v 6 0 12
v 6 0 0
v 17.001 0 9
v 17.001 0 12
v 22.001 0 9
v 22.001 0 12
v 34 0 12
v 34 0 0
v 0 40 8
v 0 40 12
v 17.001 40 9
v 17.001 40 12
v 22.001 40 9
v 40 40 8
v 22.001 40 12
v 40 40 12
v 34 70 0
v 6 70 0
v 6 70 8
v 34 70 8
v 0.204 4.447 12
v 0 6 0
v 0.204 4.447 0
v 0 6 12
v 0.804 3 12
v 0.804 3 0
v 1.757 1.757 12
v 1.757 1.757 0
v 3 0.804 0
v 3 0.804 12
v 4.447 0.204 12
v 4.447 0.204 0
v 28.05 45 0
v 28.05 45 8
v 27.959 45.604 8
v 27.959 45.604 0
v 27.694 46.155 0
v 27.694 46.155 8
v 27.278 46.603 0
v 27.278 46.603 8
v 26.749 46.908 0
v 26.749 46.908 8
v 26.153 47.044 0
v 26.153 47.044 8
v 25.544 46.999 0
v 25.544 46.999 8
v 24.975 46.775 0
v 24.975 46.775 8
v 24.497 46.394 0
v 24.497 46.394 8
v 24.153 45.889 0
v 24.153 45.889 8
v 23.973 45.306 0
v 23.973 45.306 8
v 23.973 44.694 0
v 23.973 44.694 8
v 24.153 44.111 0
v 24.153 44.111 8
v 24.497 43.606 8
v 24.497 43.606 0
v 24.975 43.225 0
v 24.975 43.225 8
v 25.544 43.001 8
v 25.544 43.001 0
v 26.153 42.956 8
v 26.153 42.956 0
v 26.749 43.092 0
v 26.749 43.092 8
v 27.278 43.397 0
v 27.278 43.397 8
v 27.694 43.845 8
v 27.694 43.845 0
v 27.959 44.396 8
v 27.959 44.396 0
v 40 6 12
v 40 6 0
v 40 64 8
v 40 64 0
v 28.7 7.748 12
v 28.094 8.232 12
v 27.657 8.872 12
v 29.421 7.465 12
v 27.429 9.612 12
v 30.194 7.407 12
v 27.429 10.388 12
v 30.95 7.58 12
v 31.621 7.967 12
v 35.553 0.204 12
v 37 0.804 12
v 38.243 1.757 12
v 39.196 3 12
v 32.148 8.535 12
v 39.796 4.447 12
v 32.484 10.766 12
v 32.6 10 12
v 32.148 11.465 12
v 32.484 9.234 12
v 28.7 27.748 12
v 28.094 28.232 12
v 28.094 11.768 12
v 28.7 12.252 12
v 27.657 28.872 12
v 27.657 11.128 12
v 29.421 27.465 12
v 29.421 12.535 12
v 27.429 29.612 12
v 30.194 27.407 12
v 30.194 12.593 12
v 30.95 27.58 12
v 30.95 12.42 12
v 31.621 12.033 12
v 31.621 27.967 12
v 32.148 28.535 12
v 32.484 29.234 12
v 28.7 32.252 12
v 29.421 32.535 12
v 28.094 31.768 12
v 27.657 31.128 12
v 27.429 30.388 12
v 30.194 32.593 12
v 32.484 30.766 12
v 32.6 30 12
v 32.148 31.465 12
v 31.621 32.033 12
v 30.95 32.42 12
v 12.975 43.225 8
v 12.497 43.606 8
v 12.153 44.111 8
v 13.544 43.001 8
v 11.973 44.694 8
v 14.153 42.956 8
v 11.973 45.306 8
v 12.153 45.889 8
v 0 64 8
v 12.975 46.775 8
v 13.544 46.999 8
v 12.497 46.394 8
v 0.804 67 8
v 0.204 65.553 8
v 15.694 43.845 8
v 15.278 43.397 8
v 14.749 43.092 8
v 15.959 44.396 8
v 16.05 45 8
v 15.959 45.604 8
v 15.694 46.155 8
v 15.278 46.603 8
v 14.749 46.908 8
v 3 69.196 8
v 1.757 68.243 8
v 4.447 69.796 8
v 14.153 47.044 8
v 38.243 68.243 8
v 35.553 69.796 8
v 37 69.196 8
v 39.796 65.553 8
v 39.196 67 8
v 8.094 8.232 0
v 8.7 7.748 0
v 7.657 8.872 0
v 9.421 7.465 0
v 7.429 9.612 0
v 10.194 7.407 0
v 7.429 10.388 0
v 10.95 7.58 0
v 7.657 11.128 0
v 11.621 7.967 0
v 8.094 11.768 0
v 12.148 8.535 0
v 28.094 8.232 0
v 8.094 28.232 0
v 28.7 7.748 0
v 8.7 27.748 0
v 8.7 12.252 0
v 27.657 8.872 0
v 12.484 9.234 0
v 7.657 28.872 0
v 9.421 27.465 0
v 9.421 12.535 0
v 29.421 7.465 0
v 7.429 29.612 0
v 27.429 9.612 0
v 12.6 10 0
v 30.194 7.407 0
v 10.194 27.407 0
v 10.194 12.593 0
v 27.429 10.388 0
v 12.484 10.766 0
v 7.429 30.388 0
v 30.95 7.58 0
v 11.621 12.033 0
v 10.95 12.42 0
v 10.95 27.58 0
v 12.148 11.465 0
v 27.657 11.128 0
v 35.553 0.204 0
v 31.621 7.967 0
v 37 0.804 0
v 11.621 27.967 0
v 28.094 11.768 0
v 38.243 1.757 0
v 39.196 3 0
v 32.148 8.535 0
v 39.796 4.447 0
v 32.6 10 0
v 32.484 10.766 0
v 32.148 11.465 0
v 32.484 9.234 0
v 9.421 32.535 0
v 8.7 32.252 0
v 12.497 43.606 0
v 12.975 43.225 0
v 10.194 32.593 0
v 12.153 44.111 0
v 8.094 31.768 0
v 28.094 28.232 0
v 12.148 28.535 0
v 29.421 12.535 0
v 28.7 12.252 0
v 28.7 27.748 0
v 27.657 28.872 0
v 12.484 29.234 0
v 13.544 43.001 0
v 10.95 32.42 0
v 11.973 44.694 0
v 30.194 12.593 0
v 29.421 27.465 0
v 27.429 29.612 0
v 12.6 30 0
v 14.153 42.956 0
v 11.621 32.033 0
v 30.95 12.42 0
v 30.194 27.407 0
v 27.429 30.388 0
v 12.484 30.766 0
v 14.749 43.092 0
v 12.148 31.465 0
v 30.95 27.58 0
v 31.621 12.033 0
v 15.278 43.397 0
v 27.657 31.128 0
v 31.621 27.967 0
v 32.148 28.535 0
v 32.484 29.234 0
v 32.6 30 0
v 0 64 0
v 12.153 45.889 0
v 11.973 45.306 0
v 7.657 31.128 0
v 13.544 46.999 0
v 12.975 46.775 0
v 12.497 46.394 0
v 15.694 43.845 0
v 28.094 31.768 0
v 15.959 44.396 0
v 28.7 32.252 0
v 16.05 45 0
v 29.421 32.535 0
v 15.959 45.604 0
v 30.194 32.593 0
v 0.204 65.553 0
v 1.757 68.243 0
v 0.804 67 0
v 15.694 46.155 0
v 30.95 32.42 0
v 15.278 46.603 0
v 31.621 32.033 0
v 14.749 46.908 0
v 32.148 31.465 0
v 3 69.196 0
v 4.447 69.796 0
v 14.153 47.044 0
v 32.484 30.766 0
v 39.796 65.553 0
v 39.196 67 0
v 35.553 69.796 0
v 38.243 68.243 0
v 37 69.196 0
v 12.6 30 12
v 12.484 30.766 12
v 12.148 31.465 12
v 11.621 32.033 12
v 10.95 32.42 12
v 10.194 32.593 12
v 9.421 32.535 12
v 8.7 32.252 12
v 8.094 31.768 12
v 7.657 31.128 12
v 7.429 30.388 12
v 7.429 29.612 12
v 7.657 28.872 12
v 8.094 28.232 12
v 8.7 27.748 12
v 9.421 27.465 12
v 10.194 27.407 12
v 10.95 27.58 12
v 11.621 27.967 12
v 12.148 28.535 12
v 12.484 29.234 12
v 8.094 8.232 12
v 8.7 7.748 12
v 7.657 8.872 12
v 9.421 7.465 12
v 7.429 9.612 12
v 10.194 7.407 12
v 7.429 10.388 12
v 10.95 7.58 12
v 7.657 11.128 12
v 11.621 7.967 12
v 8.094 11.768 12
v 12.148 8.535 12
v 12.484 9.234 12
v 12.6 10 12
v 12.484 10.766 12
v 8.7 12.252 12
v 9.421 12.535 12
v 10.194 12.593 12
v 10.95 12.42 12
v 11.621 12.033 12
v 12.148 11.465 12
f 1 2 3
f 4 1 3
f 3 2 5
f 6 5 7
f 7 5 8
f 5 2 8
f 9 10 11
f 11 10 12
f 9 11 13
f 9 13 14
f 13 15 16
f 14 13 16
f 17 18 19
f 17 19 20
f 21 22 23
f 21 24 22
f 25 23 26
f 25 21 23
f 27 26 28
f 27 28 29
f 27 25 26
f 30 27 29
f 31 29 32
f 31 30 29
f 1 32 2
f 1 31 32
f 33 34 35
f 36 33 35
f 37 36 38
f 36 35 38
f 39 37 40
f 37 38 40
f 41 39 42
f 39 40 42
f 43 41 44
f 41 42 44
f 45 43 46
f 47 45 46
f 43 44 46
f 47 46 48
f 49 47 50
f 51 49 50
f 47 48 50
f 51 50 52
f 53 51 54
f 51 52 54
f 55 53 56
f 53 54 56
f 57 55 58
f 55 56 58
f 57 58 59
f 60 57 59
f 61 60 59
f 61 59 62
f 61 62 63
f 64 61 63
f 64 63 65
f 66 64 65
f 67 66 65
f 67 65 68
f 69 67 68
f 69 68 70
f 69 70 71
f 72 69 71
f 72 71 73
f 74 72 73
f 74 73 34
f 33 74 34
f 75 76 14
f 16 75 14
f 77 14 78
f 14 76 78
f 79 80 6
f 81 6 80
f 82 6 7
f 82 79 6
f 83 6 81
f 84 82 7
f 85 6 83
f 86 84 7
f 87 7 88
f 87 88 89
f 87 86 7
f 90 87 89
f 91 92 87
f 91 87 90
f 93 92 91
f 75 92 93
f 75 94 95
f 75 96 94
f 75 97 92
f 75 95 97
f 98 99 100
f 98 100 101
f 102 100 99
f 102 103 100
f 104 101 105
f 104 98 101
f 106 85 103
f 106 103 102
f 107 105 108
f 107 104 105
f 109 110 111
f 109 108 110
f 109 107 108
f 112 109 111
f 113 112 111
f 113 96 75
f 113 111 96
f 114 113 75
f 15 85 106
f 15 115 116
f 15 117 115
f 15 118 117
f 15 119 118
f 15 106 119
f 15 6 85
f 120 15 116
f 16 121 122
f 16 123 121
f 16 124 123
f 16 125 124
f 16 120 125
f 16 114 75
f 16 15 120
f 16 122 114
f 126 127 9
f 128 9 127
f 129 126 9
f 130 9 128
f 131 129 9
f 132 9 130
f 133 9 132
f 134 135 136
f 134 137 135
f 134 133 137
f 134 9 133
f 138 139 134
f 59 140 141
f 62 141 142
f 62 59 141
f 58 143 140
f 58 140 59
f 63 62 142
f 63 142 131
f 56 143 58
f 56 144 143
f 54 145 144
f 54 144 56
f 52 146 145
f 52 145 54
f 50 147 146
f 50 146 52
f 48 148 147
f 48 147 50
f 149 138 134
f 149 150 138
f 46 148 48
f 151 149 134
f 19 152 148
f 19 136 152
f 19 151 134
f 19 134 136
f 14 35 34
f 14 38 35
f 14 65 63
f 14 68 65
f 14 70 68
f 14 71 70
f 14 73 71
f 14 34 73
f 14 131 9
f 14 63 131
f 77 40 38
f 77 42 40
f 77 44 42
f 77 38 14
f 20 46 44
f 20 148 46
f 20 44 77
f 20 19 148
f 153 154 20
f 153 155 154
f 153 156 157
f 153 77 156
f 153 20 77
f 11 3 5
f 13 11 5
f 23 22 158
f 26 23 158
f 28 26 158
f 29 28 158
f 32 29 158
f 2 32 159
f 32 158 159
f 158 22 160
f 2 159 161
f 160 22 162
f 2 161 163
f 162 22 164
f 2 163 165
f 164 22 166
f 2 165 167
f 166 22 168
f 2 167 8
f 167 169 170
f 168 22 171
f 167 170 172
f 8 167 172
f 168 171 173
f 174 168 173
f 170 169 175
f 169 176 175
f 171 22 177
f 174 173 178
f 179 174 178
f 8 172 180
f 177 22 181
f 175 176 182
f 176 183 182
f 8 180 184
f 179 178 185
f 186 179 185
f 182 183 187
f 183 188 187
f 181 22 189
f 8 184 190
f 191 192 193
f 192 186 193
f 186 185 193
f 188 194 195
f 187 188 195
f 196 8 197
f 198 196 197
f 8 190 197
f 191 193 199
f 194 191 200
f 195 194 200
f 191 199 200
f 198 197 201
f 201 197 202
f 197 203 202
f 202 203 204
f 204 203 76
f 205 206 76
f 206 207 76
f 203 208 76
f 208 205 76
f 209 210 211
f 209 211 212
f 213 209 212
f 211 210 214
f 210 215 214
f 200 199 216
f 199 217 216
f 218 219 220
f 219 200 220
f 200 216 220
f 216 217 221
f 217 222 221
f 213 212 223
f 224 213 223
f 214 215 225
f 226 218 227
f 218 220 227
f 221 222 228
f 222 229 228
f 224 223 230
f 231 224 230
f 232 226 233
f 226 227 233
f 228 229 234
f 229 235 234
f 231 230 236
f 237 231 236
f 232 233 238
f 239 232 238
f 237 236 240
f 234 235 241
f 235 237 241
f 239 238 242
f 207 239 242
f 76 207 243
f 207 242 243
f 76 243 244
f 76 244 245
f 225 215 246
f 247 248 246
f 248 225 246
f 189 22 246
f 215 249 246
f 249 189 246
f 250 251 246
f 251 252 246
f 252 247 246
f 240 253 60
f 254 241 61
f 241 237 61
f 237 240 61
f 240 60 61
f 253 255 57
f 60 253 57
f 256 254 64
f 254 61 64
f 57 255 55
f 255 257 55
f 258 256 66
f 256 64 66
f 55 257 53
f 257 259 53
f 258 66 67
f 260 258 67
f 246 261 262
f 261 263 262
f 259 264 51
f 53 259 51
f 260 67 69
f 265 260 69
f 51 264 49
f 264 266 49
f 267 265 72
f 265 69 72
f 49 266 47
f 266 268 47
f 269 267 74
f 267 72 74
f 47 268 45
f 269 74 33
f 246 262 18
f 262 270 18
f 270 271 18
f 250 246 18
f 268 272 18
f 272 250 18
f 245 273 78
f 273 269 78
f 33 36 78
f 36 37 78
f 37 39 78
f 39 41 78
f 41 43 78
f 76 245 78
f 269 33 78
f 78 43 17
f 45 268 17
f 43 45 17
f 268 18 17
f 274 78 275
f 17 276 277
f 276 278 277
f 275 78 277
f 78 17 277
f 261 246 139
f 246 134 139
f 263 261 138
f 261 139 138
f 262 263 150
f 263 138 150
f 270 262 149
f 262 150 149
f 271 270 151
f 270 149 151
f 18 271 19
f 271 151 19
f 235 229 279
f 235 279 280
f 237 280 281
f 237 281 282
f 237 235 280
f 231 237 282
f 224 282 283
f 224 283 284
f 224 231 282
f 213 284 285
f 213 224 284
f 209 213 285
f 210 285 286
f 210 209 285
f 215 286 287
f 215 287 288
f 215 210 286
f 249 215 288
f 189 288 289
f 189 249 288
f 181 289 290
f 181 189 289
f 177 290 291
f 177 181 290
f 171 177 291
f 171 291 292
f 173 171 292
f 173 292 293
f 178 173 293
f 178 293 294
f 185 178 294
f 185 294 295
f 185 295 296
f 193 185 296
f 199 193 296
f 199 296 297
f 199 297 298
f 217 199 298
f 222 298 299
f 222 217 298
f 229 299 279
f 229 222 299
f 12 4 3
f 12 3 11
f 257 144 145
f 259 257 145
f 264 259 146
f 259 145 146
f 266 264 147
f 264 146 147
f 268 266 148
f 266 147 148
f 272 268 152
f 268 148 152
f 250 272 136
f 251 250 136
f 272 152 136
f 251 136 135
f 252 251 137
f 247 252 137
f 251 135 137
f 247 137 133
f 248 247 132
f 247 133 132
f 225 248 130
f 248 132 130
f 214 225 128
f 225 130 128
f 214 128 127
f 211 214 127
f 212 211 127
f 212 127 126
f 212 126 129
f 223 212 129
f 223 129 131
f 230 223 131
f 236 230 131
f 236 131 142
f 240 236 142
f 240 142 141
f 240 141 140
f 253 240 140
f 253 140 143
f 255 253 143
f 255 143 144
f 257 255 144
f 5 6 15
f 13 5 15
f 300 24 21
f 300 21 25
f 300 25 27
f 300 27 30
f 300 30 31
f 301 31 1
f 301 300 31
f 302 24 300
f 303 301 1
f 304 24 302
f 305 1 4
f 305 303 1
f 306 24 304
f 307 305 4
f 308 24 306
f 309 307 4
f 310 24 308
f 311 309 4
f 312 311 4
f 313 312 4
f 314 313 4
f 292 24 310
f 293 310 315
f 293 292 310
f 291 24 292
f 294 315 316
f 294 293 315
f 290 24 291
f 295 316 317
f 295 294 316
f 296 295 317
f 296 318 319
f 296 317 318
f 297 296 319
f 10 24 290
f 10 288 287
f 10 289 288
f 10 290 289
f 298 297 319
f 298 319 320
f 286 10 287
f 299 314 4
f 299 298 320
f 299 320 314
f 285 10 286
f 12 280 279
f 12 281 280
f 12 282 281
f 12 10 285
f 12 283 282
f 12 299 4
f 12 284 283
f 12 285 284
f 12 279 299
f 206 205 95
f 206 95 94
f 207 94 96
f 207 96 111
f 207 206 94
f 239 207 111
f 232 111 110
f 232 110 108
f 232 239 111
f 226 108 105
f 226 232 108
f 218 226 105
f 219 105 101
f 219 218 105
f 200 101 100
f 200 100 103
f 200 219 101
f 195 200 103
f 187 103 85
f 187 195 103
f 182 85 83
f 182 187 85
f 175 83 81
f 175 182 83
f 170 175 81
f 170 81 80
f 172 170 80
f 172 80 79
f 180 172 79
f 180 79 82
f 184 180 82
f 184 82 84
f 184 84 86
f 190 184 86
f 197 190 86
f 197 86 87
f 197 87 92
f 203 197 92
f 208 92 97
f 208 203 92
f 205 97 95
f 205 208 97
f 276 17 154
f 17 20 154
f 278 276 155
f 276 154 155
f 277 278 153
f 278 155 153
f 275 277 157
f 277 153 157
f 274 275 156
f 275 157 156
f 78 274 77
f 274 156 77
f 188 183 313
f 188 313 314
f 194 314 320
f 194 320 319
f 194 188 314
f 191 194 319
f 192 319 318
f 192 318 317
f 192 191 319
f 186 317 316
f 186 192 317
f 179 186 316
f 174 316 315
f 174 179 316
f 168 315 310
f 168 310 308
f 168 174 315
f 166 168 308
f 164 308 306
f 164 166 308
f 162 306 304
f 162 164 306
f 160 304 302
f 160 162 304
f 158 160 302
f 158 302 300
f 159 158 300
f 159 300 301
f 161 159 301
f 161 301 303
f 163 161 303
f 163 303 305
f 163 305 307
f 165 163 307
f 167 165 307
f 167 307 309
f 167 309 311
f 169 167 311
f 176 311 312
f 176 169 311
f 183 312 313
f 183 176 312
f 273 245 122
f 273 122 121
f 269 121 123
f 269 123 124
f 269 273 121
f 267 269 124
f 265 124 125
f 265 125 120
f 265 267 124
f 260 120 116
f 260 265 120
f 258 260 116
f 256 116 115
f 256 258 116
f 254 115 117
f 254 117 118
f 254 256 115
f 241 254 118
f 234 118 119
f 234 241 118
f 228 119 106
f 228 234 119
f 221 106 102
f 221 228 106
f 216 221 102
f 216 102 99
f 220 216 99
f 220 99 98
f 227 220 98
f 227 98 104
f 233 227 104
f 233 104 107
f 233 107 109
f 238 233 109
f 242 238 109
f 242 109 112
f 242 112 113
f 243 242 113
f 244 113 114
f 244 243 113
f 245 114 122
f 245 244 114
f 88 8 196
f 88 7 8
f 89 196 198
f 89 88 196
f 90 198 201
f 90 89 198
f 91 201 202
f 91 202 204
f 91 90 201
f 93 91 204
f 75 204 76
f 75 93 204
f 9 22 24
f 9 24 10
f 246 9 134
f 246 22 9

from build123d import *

# Parameters (mm, degrees)
SKETCH_W        = 40
SKETCH_H        = 70
SKETCH_R        = 2.6
PAD_DEPTH       = 12
SKETCH001_W     = 40
SKETCH001_H     = 30
POCKET_DEPTH    = 4
SKETCH002_R     = 2.05
POCKET001_DEPTH = 10
SKETCH003_W     = 5
SKETCH003_H     = 40.063374
POCKET002_DEPTH = 3
FILLET_R        = 6


with BuildPart() as part:
    # Sketch → Pad (new body)
    with BuildSketch(Plane.XY):
        with Locations((20, 35)):
            Rectangle(SKETCH_W, SKETCH_H)
        with Locations((10, 10)):
            Circle(SKETCH_R, mode=Mode.SUBTRACT)
        with Locations((30, 10)):
            Circle(SKETCH_R, mode=Mode.SUBTRACT)
        with Locations((10, 30)):
            Circle(SKETCH_R, mode=Mode.SUBTRACT)
        with Locations((30, 30)):
            Circle(SKETCH_R, mode=Mode.SUBTRACT)
    extrude(amount=PAD_DEPTH)

    # Sketch001 (on Face10 of Pad) → Pocket (cut)
    with BuildSketch(Plane.XY.offset(12)):
        with Locations((20, 55)):
            Rectangle(SKETCH001_W, SKETCH001_H)
    extrude(amount=-POCKET_DEPTH, mode=Mode.SUBTRACT)

    # Sketch002 (on Face7 of Pocket) → Pocket001 (cut)
    with BuildSketch(Plane.XY.offset(8)):
        with Locations((14, 45)):
            Circle(SKETCH002_R)
        with Locations((26, 45)):
            Circle(SKETCH002_R)
    extrude(amount=-POCKET001_DEPTH, mode=Mode.SUBTRACT)

    # Sketch003 (on Face5 of Pocket001) → Pocket002 (cut)
    with BuildSketch(Plane.XY.offset(12)):
        with Locations((19.500526, 20.031687)):
            Rectangle(SKETCH003_W, SKETCH003_H)
    extrude(amount=-POCKET002_DEPTH, mode=Mode.SUBTRACT)

    # Fillet
    fillet_edges = [part.edges().sort_by_distance(p)[0] for p in [
        (40, 0, 6),
        (40, 70, 4),
        (0, 70, 4),
        (0, 0, 6),
    ]]
    fillet(fillet_edges, radius=FILLET_R)


solid = part.part
